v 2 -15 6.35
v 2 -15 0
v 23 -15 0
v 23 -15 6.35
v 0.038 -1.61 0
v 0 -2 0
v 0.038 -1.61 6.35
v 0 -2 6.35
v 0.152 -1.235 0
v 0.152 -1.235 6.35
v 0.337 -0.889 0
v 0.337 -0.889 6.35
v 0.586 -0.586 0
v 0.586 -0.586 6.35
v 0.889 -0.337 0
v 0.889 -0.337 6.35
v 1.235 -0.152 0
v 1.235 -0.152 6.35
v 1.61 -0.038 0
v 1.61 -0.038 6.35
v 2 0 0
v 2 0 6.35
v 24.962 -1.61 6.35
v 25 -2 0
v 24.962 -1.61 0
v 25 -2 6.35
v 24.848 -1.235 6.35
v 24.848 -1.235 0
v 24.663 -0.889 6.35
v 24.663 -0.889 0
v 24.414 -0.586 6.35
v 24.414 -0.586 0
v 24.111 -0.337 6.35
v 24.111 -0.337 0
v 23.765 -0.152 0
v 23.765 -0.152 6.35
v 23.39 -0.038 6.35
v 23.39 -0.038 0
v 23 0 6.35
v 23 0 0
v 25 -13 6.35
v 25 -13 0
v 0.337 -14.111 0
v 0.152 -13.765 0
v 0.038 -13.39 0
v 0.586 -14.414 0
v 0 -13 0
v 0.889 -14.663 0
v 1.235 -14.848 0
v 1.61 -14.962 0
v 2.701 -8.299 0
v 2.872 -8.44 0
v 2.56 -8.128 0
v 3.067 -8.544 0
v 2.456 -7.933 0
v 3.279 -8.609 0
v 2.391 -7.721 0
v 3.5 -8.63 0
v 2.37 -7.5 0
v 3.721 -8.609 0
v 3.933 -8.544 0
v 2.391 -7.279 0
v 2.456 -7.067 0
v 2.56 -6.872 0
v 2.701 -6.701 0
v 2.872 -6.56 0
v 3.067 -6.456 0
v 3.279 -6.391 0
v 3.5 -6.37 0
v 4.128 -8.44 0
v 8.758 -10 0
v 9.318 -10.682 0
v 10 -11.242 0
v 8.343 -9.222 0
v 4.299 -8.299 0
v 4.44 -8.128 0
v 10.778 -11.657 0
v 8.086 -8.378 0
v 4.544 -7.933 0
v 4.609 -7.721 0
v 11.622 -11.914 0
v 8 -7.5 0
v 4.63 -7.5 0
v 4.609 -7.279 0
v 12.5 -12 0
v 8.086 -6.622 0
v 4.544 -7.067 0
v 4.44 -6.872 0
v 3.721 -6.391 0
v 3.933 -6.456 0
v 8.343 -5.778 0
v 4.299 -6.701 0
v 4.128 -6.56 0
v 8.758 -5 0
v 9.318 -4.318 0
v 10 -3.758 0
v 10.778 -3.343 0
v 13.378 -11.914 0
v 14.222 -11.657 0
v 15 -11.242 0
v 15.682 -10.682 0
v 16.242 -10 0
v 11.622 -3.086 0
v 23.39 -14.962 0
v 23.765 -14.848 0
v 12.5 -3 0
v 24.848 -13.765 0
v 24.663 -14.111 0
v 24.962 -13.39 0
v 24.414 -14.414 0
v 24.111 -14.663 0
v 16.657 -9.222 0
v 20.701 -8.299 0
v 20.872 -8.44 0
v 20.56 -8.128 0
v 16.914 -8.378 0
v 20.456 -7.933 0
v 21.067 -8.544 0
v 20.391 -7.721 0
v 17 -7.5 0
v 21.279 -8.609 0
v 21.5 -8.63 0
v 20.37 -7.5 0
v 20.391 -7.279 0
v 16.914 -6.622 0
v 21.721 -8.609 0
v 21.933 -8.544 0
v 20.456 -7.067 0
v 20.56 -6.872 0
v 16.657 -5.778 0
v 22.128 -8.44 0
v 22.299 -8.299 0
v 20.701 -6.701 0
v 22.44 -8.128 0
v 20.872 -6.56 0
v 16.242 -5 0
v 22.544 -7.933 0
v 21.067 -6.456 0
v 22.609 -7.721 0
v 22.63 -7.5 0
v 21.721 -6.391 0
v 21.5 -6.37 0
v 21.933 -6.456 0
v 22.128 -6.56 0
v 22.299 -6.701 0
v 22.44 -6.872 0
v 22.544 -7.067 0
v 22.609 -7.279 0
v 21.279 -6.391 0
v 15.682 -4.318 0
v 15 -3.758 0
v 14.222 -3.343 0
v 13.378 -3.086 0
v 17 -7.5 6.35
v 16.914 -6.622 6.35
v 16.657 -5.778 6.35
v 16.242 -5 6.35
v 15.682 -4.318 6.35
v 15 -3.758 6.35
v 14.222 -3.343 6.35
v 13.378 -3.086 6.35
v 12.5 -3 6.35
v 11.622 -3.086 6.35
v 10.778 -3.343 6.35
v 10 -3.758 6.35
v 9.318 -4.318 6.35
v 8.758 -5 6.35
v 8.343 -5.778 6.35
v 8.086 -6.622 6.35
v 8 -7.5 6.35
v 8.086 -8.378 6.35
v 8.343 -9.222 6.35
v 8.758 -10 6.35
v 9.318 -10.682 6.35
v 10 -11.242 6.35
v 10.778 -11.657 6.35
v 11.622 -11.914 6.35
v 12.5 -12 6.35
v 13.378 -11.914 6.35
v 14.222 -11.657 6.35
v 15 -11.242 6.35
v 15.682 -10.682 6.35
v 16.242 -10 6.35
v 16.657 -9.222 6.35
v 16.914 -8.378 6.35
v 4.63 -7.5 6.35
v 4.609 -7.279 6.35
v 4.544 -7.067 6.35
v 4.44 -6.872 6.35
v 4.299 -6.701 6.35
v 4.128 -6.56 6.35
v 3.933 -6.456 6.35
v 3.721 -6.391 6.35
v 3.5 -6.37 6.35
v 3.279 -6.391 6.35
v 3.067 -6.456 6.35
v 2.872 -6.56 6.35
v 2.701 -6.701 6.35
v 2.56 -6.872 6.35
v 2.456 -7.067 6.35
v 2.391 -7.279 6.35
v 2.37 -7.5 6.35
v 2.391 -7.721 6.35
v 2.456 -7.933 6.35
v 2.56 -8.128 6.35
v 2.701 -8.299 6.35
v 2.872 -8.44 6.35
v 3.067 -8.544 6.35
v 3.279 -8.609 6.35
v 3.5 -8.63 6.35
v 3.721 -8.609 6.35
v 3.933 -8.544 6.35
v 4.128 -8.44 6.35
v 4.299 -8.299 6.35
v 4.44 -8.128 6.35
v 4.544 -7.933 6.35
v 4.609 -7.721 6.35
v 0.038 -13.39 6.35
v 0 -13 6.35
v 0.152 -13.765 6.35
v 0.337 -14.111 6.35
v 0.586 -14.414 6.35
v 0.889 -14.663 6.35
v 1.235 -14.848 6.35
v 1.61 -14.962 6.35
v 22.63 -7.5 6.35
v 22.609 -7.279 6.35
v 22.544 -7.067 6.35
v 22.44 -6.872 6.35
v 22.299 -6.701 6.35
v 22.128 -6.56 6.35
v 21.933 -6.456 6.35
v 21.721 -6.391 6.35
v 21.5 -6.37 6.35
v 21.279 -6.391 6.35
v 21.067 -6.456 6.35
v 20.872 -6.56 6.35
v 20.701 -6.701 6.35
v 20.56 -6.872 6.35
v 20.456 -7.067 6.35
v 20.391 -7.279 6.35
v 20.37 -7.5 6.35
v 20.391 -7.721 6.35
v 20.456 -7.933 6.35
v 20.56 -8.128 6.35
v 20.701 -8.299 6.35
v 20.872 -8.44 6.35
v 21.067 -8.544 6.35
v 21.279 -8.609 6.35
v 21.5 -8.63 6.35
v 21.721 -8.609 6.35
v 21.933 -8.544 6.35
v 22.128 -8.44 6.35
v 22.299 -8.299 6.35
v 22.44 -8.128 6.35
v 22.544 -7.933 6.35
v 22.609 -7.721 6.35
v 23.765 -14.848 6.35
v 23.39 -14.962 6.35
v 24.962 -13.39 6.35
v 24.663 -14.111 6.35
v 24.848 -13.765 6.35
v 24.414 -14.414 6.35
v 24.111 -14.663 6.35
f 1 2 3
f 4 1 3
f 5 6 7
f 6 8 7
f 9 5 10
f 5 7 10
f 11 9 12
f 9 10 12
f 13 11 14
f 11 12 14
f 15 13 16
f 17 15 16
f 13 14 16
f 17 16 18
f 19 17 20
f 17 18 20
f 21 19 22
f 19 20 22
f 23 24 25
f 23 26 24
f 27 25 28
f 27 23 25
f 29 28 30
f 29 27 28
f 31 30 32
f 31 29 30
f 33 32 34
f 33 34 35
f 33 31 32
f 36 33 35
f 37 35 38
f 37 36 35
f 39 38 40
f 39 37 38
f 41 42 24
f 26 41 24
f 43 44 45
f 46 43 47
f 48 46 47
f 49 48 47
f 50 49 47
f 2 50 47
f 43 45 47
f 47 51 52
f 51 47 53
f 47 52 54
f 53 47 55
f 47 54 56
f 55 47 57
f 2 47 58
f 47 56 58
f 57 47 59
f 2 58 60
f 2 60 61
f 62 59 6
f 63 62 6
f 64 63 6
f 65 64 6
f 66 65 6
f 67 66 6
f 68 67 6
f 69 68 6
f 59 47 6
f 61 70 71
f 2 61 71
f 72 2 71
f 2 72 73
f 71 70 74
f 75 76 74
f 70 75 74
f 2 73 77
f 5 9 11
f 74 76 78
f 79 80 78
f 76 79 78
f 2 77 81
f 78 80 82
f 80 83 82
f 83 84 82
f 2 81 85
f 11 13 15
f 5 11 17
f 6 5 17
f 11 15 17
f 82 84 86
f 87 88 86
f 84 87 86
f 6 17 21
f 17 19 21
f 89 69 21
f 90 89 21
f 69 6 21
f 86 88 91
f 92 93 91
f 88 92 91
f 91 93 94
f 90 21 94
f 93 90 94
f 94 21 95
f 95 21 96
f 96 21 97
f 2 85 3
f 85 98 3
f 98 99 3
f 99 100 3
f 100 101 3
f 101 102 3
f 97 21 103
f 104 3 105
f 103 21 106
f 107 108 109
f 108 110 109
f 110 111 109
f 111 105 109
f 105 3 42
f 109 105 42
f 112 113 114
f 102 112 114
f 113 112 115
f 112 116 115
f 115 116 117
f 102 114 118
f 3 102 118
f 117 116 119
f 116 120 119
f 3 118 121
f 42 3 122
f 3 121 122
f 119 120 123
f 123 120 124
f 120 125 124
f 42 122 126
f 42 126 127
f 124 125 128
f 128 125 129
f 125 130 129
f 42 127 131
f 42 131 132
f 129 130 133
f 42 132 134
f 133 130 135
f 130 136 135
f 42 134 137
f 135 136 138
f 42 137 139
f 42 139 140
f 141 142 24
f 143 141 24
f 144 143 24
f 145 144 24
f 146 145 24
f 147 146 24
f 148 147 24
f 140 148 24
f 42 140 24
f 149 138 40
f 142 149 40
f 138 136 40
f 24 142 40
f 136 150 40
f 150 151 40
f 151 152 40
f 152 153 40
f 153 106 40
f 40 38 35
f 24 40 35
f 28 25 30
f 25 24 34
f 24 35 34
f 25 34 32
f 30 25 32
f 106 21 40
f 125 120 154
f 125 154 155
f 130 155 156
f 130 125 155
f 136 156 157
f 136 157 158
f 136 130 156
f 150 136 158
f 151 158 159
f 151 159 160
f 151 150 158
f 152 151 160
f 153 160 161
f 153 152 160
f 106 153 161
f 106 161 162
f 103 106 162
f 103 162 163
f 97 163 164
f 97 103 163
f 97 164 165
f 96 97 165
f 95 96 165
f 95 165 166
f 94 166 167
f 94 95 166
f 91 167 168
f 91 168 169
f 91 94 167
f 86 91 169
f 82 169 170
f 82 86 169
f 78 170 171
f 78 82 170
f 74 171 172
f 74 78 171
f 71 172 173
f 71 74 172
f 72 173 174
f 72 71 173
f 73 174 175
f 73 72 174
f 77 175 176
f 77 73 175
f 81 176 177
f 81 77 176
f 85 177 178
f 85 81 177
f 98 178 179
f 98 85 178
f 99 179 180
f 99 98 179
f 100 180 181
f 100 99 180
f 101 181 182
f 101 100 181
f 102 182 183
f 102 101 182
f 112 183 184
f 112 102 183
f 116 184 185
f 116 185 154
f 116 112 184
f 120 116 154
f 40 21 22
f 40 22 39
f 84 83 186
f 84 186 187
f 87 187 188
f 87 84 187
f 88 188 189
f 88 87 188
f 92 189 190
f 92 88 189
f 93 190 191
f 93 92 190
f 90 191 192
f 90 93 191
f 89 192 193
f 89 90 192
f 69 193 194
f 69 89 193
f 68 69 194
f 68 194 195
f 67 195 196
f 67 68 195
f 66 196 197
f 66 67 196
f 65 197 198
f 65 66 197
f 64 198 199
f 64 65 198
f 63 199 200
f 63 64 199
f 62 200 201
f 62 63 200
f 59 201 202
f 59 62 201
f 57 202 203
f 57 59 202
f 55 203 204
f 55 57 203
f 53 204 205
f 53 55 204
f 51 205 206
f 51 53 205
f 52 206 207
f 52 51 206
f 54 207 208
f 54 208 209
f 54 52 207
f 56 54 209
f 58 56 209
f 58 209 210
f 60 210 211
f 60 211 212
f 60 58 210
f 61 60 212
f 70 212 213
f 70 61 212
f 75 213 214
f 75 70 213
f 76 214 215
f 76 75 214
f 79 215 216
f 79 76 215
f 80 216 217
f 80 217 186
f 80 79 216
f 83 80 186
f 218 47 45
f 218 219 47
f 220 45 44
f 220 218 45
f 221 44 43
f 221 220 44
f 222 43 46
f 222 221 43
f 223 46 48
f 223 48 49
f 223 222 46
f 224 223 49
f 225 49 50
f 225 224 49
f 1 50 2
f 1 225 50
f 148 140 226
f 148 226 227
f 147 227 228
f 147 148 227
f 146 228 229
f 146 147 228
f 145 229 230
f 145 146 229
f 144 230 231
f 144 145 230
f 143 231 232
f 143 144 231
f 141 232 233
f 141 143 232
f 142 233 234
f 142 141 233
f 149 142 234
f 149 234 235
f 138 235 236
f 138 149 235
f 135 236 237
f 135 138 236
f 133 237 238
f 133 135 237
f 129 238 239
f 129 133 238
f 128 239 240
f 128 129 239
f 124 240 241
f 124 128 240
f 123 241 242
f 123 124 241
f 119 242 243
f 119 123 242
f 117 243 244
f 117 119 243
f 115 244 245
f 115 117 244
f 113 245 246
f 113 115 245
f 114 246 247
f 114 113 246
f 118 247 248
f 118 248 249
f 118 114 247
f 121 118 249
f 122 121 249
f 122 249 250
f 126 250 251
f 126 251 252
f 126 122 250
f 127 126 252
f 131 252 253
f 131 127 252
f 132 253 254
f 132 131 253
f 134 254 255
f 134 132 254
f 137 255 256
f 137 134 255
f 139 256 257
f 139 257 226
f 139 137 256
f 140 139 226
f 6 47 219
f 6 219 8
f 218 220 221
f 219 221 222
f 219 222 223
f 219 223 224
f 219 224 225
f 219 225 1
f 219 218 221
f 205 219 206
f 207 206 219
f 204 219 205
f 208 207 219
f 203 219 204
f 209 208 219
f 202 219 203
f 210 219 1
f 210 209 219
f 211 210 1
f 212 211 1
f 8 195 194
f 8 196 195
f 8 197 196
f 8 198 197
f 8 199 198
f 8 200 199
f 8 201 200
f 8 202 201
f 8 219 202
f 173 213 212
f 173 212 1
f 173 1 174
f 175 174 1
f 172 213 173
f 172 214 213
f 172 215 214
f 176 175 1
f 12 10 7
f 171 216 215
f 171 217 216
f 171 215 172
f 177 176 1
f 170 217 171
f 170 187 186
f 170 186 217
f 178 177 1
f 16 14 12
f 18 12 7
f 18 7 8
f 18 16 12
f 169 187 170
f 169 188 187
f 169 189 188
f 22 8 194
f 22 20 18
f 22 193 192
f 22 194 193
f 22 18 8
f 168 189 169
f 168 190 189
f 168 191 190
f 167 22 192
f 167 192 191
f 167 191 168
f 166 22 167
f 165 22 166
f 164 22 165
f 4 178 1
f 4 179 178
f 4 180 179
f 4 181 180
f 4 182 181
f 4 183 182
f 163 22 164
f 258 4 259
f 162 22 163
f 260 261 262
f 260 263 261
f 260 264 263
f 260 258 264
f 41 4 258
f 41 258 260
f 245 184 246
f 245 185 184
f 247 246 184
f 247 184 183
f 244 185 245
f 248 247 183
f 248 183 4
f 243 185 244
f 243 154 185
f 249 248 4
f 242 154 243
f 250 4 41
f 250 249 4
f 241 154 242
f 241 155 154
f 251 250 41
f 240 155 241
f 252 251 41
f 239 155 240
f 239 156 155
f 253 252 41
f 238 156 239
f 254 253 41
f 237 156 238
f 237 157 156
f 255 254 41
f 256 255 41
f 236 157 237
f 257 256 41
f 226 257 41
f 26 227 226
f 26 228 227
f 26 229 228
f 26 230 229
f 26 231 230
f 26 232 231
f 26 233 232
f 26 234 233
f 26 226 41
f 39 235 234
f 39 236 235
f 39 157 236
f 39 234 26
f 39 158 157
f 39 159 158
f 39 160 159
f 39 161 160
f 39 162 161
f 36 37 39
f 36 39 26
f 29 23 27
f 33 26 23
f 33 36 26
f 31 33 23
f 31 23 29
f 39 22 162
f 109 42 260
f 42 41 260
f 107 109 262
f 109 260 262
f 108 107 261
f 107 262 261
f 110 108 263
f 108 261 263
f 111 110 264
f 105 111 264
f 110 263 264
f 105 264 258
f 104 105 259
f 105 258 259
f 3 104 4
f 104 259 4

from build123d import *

# Parameters (mm, degrees)
SKETCH1_W             = 25
SKETCH1_H             = 15
SKETCH1_R             = 4.5
SKETCH1_R_2           = 1.1303
BOSS_EXTRUDE1_DEPTH   = 6.35
F_4_40_TAPPED_HOLE1_D = 2.2606
FILLET1_R             = 2


with BuildPart() as part:
    # Sketch1 → Boss-Extrude1 (new body)
    with BuildSketch(Plane.XY):
        with Locations((12.5, -7.5)):
            Rectangle(SKETCH1_W, SKETCH1_H)
        with Locations((12.5, -7.5)):
            Circle(SKETCH1_R, mode=Mode.SUBTRACT)
        with Locations((3.5, -7.5)):
            Circle(SKETCH1_R_2, mode=Mode.SUBTRACT)
        with Locations((21.5, -7.5)):
            Circle(SKETCH1_R_2, mode=Mode.SUBTRACT)
    extrude(amount=BOSS_EXTRUDE1_DEPTH)

    # #4-40 Tapped Hole1 (through all)
    with Locations(Plane(origin=(21.5, -7.5, 6.35), x_dir=(1, 0, 0), z_dir=(0, 0, 1))):
        with Locations((0, 0), (-18, 0)):
            Hole(F_4_40_TAPPED_HOLE1_D / 2)

    # Fillet1
    fillet1_edges = [part.edges().sort_by_distance(p)[0] for p in [
        (0, 0, 3.175),
        (25, 0, 3.175),
        (25, -15, 3.175),
        (0, -15, 3.175),
    ]]
    fillet(fillet1_edges, radius=FILLET1_R)


solid = part.part
